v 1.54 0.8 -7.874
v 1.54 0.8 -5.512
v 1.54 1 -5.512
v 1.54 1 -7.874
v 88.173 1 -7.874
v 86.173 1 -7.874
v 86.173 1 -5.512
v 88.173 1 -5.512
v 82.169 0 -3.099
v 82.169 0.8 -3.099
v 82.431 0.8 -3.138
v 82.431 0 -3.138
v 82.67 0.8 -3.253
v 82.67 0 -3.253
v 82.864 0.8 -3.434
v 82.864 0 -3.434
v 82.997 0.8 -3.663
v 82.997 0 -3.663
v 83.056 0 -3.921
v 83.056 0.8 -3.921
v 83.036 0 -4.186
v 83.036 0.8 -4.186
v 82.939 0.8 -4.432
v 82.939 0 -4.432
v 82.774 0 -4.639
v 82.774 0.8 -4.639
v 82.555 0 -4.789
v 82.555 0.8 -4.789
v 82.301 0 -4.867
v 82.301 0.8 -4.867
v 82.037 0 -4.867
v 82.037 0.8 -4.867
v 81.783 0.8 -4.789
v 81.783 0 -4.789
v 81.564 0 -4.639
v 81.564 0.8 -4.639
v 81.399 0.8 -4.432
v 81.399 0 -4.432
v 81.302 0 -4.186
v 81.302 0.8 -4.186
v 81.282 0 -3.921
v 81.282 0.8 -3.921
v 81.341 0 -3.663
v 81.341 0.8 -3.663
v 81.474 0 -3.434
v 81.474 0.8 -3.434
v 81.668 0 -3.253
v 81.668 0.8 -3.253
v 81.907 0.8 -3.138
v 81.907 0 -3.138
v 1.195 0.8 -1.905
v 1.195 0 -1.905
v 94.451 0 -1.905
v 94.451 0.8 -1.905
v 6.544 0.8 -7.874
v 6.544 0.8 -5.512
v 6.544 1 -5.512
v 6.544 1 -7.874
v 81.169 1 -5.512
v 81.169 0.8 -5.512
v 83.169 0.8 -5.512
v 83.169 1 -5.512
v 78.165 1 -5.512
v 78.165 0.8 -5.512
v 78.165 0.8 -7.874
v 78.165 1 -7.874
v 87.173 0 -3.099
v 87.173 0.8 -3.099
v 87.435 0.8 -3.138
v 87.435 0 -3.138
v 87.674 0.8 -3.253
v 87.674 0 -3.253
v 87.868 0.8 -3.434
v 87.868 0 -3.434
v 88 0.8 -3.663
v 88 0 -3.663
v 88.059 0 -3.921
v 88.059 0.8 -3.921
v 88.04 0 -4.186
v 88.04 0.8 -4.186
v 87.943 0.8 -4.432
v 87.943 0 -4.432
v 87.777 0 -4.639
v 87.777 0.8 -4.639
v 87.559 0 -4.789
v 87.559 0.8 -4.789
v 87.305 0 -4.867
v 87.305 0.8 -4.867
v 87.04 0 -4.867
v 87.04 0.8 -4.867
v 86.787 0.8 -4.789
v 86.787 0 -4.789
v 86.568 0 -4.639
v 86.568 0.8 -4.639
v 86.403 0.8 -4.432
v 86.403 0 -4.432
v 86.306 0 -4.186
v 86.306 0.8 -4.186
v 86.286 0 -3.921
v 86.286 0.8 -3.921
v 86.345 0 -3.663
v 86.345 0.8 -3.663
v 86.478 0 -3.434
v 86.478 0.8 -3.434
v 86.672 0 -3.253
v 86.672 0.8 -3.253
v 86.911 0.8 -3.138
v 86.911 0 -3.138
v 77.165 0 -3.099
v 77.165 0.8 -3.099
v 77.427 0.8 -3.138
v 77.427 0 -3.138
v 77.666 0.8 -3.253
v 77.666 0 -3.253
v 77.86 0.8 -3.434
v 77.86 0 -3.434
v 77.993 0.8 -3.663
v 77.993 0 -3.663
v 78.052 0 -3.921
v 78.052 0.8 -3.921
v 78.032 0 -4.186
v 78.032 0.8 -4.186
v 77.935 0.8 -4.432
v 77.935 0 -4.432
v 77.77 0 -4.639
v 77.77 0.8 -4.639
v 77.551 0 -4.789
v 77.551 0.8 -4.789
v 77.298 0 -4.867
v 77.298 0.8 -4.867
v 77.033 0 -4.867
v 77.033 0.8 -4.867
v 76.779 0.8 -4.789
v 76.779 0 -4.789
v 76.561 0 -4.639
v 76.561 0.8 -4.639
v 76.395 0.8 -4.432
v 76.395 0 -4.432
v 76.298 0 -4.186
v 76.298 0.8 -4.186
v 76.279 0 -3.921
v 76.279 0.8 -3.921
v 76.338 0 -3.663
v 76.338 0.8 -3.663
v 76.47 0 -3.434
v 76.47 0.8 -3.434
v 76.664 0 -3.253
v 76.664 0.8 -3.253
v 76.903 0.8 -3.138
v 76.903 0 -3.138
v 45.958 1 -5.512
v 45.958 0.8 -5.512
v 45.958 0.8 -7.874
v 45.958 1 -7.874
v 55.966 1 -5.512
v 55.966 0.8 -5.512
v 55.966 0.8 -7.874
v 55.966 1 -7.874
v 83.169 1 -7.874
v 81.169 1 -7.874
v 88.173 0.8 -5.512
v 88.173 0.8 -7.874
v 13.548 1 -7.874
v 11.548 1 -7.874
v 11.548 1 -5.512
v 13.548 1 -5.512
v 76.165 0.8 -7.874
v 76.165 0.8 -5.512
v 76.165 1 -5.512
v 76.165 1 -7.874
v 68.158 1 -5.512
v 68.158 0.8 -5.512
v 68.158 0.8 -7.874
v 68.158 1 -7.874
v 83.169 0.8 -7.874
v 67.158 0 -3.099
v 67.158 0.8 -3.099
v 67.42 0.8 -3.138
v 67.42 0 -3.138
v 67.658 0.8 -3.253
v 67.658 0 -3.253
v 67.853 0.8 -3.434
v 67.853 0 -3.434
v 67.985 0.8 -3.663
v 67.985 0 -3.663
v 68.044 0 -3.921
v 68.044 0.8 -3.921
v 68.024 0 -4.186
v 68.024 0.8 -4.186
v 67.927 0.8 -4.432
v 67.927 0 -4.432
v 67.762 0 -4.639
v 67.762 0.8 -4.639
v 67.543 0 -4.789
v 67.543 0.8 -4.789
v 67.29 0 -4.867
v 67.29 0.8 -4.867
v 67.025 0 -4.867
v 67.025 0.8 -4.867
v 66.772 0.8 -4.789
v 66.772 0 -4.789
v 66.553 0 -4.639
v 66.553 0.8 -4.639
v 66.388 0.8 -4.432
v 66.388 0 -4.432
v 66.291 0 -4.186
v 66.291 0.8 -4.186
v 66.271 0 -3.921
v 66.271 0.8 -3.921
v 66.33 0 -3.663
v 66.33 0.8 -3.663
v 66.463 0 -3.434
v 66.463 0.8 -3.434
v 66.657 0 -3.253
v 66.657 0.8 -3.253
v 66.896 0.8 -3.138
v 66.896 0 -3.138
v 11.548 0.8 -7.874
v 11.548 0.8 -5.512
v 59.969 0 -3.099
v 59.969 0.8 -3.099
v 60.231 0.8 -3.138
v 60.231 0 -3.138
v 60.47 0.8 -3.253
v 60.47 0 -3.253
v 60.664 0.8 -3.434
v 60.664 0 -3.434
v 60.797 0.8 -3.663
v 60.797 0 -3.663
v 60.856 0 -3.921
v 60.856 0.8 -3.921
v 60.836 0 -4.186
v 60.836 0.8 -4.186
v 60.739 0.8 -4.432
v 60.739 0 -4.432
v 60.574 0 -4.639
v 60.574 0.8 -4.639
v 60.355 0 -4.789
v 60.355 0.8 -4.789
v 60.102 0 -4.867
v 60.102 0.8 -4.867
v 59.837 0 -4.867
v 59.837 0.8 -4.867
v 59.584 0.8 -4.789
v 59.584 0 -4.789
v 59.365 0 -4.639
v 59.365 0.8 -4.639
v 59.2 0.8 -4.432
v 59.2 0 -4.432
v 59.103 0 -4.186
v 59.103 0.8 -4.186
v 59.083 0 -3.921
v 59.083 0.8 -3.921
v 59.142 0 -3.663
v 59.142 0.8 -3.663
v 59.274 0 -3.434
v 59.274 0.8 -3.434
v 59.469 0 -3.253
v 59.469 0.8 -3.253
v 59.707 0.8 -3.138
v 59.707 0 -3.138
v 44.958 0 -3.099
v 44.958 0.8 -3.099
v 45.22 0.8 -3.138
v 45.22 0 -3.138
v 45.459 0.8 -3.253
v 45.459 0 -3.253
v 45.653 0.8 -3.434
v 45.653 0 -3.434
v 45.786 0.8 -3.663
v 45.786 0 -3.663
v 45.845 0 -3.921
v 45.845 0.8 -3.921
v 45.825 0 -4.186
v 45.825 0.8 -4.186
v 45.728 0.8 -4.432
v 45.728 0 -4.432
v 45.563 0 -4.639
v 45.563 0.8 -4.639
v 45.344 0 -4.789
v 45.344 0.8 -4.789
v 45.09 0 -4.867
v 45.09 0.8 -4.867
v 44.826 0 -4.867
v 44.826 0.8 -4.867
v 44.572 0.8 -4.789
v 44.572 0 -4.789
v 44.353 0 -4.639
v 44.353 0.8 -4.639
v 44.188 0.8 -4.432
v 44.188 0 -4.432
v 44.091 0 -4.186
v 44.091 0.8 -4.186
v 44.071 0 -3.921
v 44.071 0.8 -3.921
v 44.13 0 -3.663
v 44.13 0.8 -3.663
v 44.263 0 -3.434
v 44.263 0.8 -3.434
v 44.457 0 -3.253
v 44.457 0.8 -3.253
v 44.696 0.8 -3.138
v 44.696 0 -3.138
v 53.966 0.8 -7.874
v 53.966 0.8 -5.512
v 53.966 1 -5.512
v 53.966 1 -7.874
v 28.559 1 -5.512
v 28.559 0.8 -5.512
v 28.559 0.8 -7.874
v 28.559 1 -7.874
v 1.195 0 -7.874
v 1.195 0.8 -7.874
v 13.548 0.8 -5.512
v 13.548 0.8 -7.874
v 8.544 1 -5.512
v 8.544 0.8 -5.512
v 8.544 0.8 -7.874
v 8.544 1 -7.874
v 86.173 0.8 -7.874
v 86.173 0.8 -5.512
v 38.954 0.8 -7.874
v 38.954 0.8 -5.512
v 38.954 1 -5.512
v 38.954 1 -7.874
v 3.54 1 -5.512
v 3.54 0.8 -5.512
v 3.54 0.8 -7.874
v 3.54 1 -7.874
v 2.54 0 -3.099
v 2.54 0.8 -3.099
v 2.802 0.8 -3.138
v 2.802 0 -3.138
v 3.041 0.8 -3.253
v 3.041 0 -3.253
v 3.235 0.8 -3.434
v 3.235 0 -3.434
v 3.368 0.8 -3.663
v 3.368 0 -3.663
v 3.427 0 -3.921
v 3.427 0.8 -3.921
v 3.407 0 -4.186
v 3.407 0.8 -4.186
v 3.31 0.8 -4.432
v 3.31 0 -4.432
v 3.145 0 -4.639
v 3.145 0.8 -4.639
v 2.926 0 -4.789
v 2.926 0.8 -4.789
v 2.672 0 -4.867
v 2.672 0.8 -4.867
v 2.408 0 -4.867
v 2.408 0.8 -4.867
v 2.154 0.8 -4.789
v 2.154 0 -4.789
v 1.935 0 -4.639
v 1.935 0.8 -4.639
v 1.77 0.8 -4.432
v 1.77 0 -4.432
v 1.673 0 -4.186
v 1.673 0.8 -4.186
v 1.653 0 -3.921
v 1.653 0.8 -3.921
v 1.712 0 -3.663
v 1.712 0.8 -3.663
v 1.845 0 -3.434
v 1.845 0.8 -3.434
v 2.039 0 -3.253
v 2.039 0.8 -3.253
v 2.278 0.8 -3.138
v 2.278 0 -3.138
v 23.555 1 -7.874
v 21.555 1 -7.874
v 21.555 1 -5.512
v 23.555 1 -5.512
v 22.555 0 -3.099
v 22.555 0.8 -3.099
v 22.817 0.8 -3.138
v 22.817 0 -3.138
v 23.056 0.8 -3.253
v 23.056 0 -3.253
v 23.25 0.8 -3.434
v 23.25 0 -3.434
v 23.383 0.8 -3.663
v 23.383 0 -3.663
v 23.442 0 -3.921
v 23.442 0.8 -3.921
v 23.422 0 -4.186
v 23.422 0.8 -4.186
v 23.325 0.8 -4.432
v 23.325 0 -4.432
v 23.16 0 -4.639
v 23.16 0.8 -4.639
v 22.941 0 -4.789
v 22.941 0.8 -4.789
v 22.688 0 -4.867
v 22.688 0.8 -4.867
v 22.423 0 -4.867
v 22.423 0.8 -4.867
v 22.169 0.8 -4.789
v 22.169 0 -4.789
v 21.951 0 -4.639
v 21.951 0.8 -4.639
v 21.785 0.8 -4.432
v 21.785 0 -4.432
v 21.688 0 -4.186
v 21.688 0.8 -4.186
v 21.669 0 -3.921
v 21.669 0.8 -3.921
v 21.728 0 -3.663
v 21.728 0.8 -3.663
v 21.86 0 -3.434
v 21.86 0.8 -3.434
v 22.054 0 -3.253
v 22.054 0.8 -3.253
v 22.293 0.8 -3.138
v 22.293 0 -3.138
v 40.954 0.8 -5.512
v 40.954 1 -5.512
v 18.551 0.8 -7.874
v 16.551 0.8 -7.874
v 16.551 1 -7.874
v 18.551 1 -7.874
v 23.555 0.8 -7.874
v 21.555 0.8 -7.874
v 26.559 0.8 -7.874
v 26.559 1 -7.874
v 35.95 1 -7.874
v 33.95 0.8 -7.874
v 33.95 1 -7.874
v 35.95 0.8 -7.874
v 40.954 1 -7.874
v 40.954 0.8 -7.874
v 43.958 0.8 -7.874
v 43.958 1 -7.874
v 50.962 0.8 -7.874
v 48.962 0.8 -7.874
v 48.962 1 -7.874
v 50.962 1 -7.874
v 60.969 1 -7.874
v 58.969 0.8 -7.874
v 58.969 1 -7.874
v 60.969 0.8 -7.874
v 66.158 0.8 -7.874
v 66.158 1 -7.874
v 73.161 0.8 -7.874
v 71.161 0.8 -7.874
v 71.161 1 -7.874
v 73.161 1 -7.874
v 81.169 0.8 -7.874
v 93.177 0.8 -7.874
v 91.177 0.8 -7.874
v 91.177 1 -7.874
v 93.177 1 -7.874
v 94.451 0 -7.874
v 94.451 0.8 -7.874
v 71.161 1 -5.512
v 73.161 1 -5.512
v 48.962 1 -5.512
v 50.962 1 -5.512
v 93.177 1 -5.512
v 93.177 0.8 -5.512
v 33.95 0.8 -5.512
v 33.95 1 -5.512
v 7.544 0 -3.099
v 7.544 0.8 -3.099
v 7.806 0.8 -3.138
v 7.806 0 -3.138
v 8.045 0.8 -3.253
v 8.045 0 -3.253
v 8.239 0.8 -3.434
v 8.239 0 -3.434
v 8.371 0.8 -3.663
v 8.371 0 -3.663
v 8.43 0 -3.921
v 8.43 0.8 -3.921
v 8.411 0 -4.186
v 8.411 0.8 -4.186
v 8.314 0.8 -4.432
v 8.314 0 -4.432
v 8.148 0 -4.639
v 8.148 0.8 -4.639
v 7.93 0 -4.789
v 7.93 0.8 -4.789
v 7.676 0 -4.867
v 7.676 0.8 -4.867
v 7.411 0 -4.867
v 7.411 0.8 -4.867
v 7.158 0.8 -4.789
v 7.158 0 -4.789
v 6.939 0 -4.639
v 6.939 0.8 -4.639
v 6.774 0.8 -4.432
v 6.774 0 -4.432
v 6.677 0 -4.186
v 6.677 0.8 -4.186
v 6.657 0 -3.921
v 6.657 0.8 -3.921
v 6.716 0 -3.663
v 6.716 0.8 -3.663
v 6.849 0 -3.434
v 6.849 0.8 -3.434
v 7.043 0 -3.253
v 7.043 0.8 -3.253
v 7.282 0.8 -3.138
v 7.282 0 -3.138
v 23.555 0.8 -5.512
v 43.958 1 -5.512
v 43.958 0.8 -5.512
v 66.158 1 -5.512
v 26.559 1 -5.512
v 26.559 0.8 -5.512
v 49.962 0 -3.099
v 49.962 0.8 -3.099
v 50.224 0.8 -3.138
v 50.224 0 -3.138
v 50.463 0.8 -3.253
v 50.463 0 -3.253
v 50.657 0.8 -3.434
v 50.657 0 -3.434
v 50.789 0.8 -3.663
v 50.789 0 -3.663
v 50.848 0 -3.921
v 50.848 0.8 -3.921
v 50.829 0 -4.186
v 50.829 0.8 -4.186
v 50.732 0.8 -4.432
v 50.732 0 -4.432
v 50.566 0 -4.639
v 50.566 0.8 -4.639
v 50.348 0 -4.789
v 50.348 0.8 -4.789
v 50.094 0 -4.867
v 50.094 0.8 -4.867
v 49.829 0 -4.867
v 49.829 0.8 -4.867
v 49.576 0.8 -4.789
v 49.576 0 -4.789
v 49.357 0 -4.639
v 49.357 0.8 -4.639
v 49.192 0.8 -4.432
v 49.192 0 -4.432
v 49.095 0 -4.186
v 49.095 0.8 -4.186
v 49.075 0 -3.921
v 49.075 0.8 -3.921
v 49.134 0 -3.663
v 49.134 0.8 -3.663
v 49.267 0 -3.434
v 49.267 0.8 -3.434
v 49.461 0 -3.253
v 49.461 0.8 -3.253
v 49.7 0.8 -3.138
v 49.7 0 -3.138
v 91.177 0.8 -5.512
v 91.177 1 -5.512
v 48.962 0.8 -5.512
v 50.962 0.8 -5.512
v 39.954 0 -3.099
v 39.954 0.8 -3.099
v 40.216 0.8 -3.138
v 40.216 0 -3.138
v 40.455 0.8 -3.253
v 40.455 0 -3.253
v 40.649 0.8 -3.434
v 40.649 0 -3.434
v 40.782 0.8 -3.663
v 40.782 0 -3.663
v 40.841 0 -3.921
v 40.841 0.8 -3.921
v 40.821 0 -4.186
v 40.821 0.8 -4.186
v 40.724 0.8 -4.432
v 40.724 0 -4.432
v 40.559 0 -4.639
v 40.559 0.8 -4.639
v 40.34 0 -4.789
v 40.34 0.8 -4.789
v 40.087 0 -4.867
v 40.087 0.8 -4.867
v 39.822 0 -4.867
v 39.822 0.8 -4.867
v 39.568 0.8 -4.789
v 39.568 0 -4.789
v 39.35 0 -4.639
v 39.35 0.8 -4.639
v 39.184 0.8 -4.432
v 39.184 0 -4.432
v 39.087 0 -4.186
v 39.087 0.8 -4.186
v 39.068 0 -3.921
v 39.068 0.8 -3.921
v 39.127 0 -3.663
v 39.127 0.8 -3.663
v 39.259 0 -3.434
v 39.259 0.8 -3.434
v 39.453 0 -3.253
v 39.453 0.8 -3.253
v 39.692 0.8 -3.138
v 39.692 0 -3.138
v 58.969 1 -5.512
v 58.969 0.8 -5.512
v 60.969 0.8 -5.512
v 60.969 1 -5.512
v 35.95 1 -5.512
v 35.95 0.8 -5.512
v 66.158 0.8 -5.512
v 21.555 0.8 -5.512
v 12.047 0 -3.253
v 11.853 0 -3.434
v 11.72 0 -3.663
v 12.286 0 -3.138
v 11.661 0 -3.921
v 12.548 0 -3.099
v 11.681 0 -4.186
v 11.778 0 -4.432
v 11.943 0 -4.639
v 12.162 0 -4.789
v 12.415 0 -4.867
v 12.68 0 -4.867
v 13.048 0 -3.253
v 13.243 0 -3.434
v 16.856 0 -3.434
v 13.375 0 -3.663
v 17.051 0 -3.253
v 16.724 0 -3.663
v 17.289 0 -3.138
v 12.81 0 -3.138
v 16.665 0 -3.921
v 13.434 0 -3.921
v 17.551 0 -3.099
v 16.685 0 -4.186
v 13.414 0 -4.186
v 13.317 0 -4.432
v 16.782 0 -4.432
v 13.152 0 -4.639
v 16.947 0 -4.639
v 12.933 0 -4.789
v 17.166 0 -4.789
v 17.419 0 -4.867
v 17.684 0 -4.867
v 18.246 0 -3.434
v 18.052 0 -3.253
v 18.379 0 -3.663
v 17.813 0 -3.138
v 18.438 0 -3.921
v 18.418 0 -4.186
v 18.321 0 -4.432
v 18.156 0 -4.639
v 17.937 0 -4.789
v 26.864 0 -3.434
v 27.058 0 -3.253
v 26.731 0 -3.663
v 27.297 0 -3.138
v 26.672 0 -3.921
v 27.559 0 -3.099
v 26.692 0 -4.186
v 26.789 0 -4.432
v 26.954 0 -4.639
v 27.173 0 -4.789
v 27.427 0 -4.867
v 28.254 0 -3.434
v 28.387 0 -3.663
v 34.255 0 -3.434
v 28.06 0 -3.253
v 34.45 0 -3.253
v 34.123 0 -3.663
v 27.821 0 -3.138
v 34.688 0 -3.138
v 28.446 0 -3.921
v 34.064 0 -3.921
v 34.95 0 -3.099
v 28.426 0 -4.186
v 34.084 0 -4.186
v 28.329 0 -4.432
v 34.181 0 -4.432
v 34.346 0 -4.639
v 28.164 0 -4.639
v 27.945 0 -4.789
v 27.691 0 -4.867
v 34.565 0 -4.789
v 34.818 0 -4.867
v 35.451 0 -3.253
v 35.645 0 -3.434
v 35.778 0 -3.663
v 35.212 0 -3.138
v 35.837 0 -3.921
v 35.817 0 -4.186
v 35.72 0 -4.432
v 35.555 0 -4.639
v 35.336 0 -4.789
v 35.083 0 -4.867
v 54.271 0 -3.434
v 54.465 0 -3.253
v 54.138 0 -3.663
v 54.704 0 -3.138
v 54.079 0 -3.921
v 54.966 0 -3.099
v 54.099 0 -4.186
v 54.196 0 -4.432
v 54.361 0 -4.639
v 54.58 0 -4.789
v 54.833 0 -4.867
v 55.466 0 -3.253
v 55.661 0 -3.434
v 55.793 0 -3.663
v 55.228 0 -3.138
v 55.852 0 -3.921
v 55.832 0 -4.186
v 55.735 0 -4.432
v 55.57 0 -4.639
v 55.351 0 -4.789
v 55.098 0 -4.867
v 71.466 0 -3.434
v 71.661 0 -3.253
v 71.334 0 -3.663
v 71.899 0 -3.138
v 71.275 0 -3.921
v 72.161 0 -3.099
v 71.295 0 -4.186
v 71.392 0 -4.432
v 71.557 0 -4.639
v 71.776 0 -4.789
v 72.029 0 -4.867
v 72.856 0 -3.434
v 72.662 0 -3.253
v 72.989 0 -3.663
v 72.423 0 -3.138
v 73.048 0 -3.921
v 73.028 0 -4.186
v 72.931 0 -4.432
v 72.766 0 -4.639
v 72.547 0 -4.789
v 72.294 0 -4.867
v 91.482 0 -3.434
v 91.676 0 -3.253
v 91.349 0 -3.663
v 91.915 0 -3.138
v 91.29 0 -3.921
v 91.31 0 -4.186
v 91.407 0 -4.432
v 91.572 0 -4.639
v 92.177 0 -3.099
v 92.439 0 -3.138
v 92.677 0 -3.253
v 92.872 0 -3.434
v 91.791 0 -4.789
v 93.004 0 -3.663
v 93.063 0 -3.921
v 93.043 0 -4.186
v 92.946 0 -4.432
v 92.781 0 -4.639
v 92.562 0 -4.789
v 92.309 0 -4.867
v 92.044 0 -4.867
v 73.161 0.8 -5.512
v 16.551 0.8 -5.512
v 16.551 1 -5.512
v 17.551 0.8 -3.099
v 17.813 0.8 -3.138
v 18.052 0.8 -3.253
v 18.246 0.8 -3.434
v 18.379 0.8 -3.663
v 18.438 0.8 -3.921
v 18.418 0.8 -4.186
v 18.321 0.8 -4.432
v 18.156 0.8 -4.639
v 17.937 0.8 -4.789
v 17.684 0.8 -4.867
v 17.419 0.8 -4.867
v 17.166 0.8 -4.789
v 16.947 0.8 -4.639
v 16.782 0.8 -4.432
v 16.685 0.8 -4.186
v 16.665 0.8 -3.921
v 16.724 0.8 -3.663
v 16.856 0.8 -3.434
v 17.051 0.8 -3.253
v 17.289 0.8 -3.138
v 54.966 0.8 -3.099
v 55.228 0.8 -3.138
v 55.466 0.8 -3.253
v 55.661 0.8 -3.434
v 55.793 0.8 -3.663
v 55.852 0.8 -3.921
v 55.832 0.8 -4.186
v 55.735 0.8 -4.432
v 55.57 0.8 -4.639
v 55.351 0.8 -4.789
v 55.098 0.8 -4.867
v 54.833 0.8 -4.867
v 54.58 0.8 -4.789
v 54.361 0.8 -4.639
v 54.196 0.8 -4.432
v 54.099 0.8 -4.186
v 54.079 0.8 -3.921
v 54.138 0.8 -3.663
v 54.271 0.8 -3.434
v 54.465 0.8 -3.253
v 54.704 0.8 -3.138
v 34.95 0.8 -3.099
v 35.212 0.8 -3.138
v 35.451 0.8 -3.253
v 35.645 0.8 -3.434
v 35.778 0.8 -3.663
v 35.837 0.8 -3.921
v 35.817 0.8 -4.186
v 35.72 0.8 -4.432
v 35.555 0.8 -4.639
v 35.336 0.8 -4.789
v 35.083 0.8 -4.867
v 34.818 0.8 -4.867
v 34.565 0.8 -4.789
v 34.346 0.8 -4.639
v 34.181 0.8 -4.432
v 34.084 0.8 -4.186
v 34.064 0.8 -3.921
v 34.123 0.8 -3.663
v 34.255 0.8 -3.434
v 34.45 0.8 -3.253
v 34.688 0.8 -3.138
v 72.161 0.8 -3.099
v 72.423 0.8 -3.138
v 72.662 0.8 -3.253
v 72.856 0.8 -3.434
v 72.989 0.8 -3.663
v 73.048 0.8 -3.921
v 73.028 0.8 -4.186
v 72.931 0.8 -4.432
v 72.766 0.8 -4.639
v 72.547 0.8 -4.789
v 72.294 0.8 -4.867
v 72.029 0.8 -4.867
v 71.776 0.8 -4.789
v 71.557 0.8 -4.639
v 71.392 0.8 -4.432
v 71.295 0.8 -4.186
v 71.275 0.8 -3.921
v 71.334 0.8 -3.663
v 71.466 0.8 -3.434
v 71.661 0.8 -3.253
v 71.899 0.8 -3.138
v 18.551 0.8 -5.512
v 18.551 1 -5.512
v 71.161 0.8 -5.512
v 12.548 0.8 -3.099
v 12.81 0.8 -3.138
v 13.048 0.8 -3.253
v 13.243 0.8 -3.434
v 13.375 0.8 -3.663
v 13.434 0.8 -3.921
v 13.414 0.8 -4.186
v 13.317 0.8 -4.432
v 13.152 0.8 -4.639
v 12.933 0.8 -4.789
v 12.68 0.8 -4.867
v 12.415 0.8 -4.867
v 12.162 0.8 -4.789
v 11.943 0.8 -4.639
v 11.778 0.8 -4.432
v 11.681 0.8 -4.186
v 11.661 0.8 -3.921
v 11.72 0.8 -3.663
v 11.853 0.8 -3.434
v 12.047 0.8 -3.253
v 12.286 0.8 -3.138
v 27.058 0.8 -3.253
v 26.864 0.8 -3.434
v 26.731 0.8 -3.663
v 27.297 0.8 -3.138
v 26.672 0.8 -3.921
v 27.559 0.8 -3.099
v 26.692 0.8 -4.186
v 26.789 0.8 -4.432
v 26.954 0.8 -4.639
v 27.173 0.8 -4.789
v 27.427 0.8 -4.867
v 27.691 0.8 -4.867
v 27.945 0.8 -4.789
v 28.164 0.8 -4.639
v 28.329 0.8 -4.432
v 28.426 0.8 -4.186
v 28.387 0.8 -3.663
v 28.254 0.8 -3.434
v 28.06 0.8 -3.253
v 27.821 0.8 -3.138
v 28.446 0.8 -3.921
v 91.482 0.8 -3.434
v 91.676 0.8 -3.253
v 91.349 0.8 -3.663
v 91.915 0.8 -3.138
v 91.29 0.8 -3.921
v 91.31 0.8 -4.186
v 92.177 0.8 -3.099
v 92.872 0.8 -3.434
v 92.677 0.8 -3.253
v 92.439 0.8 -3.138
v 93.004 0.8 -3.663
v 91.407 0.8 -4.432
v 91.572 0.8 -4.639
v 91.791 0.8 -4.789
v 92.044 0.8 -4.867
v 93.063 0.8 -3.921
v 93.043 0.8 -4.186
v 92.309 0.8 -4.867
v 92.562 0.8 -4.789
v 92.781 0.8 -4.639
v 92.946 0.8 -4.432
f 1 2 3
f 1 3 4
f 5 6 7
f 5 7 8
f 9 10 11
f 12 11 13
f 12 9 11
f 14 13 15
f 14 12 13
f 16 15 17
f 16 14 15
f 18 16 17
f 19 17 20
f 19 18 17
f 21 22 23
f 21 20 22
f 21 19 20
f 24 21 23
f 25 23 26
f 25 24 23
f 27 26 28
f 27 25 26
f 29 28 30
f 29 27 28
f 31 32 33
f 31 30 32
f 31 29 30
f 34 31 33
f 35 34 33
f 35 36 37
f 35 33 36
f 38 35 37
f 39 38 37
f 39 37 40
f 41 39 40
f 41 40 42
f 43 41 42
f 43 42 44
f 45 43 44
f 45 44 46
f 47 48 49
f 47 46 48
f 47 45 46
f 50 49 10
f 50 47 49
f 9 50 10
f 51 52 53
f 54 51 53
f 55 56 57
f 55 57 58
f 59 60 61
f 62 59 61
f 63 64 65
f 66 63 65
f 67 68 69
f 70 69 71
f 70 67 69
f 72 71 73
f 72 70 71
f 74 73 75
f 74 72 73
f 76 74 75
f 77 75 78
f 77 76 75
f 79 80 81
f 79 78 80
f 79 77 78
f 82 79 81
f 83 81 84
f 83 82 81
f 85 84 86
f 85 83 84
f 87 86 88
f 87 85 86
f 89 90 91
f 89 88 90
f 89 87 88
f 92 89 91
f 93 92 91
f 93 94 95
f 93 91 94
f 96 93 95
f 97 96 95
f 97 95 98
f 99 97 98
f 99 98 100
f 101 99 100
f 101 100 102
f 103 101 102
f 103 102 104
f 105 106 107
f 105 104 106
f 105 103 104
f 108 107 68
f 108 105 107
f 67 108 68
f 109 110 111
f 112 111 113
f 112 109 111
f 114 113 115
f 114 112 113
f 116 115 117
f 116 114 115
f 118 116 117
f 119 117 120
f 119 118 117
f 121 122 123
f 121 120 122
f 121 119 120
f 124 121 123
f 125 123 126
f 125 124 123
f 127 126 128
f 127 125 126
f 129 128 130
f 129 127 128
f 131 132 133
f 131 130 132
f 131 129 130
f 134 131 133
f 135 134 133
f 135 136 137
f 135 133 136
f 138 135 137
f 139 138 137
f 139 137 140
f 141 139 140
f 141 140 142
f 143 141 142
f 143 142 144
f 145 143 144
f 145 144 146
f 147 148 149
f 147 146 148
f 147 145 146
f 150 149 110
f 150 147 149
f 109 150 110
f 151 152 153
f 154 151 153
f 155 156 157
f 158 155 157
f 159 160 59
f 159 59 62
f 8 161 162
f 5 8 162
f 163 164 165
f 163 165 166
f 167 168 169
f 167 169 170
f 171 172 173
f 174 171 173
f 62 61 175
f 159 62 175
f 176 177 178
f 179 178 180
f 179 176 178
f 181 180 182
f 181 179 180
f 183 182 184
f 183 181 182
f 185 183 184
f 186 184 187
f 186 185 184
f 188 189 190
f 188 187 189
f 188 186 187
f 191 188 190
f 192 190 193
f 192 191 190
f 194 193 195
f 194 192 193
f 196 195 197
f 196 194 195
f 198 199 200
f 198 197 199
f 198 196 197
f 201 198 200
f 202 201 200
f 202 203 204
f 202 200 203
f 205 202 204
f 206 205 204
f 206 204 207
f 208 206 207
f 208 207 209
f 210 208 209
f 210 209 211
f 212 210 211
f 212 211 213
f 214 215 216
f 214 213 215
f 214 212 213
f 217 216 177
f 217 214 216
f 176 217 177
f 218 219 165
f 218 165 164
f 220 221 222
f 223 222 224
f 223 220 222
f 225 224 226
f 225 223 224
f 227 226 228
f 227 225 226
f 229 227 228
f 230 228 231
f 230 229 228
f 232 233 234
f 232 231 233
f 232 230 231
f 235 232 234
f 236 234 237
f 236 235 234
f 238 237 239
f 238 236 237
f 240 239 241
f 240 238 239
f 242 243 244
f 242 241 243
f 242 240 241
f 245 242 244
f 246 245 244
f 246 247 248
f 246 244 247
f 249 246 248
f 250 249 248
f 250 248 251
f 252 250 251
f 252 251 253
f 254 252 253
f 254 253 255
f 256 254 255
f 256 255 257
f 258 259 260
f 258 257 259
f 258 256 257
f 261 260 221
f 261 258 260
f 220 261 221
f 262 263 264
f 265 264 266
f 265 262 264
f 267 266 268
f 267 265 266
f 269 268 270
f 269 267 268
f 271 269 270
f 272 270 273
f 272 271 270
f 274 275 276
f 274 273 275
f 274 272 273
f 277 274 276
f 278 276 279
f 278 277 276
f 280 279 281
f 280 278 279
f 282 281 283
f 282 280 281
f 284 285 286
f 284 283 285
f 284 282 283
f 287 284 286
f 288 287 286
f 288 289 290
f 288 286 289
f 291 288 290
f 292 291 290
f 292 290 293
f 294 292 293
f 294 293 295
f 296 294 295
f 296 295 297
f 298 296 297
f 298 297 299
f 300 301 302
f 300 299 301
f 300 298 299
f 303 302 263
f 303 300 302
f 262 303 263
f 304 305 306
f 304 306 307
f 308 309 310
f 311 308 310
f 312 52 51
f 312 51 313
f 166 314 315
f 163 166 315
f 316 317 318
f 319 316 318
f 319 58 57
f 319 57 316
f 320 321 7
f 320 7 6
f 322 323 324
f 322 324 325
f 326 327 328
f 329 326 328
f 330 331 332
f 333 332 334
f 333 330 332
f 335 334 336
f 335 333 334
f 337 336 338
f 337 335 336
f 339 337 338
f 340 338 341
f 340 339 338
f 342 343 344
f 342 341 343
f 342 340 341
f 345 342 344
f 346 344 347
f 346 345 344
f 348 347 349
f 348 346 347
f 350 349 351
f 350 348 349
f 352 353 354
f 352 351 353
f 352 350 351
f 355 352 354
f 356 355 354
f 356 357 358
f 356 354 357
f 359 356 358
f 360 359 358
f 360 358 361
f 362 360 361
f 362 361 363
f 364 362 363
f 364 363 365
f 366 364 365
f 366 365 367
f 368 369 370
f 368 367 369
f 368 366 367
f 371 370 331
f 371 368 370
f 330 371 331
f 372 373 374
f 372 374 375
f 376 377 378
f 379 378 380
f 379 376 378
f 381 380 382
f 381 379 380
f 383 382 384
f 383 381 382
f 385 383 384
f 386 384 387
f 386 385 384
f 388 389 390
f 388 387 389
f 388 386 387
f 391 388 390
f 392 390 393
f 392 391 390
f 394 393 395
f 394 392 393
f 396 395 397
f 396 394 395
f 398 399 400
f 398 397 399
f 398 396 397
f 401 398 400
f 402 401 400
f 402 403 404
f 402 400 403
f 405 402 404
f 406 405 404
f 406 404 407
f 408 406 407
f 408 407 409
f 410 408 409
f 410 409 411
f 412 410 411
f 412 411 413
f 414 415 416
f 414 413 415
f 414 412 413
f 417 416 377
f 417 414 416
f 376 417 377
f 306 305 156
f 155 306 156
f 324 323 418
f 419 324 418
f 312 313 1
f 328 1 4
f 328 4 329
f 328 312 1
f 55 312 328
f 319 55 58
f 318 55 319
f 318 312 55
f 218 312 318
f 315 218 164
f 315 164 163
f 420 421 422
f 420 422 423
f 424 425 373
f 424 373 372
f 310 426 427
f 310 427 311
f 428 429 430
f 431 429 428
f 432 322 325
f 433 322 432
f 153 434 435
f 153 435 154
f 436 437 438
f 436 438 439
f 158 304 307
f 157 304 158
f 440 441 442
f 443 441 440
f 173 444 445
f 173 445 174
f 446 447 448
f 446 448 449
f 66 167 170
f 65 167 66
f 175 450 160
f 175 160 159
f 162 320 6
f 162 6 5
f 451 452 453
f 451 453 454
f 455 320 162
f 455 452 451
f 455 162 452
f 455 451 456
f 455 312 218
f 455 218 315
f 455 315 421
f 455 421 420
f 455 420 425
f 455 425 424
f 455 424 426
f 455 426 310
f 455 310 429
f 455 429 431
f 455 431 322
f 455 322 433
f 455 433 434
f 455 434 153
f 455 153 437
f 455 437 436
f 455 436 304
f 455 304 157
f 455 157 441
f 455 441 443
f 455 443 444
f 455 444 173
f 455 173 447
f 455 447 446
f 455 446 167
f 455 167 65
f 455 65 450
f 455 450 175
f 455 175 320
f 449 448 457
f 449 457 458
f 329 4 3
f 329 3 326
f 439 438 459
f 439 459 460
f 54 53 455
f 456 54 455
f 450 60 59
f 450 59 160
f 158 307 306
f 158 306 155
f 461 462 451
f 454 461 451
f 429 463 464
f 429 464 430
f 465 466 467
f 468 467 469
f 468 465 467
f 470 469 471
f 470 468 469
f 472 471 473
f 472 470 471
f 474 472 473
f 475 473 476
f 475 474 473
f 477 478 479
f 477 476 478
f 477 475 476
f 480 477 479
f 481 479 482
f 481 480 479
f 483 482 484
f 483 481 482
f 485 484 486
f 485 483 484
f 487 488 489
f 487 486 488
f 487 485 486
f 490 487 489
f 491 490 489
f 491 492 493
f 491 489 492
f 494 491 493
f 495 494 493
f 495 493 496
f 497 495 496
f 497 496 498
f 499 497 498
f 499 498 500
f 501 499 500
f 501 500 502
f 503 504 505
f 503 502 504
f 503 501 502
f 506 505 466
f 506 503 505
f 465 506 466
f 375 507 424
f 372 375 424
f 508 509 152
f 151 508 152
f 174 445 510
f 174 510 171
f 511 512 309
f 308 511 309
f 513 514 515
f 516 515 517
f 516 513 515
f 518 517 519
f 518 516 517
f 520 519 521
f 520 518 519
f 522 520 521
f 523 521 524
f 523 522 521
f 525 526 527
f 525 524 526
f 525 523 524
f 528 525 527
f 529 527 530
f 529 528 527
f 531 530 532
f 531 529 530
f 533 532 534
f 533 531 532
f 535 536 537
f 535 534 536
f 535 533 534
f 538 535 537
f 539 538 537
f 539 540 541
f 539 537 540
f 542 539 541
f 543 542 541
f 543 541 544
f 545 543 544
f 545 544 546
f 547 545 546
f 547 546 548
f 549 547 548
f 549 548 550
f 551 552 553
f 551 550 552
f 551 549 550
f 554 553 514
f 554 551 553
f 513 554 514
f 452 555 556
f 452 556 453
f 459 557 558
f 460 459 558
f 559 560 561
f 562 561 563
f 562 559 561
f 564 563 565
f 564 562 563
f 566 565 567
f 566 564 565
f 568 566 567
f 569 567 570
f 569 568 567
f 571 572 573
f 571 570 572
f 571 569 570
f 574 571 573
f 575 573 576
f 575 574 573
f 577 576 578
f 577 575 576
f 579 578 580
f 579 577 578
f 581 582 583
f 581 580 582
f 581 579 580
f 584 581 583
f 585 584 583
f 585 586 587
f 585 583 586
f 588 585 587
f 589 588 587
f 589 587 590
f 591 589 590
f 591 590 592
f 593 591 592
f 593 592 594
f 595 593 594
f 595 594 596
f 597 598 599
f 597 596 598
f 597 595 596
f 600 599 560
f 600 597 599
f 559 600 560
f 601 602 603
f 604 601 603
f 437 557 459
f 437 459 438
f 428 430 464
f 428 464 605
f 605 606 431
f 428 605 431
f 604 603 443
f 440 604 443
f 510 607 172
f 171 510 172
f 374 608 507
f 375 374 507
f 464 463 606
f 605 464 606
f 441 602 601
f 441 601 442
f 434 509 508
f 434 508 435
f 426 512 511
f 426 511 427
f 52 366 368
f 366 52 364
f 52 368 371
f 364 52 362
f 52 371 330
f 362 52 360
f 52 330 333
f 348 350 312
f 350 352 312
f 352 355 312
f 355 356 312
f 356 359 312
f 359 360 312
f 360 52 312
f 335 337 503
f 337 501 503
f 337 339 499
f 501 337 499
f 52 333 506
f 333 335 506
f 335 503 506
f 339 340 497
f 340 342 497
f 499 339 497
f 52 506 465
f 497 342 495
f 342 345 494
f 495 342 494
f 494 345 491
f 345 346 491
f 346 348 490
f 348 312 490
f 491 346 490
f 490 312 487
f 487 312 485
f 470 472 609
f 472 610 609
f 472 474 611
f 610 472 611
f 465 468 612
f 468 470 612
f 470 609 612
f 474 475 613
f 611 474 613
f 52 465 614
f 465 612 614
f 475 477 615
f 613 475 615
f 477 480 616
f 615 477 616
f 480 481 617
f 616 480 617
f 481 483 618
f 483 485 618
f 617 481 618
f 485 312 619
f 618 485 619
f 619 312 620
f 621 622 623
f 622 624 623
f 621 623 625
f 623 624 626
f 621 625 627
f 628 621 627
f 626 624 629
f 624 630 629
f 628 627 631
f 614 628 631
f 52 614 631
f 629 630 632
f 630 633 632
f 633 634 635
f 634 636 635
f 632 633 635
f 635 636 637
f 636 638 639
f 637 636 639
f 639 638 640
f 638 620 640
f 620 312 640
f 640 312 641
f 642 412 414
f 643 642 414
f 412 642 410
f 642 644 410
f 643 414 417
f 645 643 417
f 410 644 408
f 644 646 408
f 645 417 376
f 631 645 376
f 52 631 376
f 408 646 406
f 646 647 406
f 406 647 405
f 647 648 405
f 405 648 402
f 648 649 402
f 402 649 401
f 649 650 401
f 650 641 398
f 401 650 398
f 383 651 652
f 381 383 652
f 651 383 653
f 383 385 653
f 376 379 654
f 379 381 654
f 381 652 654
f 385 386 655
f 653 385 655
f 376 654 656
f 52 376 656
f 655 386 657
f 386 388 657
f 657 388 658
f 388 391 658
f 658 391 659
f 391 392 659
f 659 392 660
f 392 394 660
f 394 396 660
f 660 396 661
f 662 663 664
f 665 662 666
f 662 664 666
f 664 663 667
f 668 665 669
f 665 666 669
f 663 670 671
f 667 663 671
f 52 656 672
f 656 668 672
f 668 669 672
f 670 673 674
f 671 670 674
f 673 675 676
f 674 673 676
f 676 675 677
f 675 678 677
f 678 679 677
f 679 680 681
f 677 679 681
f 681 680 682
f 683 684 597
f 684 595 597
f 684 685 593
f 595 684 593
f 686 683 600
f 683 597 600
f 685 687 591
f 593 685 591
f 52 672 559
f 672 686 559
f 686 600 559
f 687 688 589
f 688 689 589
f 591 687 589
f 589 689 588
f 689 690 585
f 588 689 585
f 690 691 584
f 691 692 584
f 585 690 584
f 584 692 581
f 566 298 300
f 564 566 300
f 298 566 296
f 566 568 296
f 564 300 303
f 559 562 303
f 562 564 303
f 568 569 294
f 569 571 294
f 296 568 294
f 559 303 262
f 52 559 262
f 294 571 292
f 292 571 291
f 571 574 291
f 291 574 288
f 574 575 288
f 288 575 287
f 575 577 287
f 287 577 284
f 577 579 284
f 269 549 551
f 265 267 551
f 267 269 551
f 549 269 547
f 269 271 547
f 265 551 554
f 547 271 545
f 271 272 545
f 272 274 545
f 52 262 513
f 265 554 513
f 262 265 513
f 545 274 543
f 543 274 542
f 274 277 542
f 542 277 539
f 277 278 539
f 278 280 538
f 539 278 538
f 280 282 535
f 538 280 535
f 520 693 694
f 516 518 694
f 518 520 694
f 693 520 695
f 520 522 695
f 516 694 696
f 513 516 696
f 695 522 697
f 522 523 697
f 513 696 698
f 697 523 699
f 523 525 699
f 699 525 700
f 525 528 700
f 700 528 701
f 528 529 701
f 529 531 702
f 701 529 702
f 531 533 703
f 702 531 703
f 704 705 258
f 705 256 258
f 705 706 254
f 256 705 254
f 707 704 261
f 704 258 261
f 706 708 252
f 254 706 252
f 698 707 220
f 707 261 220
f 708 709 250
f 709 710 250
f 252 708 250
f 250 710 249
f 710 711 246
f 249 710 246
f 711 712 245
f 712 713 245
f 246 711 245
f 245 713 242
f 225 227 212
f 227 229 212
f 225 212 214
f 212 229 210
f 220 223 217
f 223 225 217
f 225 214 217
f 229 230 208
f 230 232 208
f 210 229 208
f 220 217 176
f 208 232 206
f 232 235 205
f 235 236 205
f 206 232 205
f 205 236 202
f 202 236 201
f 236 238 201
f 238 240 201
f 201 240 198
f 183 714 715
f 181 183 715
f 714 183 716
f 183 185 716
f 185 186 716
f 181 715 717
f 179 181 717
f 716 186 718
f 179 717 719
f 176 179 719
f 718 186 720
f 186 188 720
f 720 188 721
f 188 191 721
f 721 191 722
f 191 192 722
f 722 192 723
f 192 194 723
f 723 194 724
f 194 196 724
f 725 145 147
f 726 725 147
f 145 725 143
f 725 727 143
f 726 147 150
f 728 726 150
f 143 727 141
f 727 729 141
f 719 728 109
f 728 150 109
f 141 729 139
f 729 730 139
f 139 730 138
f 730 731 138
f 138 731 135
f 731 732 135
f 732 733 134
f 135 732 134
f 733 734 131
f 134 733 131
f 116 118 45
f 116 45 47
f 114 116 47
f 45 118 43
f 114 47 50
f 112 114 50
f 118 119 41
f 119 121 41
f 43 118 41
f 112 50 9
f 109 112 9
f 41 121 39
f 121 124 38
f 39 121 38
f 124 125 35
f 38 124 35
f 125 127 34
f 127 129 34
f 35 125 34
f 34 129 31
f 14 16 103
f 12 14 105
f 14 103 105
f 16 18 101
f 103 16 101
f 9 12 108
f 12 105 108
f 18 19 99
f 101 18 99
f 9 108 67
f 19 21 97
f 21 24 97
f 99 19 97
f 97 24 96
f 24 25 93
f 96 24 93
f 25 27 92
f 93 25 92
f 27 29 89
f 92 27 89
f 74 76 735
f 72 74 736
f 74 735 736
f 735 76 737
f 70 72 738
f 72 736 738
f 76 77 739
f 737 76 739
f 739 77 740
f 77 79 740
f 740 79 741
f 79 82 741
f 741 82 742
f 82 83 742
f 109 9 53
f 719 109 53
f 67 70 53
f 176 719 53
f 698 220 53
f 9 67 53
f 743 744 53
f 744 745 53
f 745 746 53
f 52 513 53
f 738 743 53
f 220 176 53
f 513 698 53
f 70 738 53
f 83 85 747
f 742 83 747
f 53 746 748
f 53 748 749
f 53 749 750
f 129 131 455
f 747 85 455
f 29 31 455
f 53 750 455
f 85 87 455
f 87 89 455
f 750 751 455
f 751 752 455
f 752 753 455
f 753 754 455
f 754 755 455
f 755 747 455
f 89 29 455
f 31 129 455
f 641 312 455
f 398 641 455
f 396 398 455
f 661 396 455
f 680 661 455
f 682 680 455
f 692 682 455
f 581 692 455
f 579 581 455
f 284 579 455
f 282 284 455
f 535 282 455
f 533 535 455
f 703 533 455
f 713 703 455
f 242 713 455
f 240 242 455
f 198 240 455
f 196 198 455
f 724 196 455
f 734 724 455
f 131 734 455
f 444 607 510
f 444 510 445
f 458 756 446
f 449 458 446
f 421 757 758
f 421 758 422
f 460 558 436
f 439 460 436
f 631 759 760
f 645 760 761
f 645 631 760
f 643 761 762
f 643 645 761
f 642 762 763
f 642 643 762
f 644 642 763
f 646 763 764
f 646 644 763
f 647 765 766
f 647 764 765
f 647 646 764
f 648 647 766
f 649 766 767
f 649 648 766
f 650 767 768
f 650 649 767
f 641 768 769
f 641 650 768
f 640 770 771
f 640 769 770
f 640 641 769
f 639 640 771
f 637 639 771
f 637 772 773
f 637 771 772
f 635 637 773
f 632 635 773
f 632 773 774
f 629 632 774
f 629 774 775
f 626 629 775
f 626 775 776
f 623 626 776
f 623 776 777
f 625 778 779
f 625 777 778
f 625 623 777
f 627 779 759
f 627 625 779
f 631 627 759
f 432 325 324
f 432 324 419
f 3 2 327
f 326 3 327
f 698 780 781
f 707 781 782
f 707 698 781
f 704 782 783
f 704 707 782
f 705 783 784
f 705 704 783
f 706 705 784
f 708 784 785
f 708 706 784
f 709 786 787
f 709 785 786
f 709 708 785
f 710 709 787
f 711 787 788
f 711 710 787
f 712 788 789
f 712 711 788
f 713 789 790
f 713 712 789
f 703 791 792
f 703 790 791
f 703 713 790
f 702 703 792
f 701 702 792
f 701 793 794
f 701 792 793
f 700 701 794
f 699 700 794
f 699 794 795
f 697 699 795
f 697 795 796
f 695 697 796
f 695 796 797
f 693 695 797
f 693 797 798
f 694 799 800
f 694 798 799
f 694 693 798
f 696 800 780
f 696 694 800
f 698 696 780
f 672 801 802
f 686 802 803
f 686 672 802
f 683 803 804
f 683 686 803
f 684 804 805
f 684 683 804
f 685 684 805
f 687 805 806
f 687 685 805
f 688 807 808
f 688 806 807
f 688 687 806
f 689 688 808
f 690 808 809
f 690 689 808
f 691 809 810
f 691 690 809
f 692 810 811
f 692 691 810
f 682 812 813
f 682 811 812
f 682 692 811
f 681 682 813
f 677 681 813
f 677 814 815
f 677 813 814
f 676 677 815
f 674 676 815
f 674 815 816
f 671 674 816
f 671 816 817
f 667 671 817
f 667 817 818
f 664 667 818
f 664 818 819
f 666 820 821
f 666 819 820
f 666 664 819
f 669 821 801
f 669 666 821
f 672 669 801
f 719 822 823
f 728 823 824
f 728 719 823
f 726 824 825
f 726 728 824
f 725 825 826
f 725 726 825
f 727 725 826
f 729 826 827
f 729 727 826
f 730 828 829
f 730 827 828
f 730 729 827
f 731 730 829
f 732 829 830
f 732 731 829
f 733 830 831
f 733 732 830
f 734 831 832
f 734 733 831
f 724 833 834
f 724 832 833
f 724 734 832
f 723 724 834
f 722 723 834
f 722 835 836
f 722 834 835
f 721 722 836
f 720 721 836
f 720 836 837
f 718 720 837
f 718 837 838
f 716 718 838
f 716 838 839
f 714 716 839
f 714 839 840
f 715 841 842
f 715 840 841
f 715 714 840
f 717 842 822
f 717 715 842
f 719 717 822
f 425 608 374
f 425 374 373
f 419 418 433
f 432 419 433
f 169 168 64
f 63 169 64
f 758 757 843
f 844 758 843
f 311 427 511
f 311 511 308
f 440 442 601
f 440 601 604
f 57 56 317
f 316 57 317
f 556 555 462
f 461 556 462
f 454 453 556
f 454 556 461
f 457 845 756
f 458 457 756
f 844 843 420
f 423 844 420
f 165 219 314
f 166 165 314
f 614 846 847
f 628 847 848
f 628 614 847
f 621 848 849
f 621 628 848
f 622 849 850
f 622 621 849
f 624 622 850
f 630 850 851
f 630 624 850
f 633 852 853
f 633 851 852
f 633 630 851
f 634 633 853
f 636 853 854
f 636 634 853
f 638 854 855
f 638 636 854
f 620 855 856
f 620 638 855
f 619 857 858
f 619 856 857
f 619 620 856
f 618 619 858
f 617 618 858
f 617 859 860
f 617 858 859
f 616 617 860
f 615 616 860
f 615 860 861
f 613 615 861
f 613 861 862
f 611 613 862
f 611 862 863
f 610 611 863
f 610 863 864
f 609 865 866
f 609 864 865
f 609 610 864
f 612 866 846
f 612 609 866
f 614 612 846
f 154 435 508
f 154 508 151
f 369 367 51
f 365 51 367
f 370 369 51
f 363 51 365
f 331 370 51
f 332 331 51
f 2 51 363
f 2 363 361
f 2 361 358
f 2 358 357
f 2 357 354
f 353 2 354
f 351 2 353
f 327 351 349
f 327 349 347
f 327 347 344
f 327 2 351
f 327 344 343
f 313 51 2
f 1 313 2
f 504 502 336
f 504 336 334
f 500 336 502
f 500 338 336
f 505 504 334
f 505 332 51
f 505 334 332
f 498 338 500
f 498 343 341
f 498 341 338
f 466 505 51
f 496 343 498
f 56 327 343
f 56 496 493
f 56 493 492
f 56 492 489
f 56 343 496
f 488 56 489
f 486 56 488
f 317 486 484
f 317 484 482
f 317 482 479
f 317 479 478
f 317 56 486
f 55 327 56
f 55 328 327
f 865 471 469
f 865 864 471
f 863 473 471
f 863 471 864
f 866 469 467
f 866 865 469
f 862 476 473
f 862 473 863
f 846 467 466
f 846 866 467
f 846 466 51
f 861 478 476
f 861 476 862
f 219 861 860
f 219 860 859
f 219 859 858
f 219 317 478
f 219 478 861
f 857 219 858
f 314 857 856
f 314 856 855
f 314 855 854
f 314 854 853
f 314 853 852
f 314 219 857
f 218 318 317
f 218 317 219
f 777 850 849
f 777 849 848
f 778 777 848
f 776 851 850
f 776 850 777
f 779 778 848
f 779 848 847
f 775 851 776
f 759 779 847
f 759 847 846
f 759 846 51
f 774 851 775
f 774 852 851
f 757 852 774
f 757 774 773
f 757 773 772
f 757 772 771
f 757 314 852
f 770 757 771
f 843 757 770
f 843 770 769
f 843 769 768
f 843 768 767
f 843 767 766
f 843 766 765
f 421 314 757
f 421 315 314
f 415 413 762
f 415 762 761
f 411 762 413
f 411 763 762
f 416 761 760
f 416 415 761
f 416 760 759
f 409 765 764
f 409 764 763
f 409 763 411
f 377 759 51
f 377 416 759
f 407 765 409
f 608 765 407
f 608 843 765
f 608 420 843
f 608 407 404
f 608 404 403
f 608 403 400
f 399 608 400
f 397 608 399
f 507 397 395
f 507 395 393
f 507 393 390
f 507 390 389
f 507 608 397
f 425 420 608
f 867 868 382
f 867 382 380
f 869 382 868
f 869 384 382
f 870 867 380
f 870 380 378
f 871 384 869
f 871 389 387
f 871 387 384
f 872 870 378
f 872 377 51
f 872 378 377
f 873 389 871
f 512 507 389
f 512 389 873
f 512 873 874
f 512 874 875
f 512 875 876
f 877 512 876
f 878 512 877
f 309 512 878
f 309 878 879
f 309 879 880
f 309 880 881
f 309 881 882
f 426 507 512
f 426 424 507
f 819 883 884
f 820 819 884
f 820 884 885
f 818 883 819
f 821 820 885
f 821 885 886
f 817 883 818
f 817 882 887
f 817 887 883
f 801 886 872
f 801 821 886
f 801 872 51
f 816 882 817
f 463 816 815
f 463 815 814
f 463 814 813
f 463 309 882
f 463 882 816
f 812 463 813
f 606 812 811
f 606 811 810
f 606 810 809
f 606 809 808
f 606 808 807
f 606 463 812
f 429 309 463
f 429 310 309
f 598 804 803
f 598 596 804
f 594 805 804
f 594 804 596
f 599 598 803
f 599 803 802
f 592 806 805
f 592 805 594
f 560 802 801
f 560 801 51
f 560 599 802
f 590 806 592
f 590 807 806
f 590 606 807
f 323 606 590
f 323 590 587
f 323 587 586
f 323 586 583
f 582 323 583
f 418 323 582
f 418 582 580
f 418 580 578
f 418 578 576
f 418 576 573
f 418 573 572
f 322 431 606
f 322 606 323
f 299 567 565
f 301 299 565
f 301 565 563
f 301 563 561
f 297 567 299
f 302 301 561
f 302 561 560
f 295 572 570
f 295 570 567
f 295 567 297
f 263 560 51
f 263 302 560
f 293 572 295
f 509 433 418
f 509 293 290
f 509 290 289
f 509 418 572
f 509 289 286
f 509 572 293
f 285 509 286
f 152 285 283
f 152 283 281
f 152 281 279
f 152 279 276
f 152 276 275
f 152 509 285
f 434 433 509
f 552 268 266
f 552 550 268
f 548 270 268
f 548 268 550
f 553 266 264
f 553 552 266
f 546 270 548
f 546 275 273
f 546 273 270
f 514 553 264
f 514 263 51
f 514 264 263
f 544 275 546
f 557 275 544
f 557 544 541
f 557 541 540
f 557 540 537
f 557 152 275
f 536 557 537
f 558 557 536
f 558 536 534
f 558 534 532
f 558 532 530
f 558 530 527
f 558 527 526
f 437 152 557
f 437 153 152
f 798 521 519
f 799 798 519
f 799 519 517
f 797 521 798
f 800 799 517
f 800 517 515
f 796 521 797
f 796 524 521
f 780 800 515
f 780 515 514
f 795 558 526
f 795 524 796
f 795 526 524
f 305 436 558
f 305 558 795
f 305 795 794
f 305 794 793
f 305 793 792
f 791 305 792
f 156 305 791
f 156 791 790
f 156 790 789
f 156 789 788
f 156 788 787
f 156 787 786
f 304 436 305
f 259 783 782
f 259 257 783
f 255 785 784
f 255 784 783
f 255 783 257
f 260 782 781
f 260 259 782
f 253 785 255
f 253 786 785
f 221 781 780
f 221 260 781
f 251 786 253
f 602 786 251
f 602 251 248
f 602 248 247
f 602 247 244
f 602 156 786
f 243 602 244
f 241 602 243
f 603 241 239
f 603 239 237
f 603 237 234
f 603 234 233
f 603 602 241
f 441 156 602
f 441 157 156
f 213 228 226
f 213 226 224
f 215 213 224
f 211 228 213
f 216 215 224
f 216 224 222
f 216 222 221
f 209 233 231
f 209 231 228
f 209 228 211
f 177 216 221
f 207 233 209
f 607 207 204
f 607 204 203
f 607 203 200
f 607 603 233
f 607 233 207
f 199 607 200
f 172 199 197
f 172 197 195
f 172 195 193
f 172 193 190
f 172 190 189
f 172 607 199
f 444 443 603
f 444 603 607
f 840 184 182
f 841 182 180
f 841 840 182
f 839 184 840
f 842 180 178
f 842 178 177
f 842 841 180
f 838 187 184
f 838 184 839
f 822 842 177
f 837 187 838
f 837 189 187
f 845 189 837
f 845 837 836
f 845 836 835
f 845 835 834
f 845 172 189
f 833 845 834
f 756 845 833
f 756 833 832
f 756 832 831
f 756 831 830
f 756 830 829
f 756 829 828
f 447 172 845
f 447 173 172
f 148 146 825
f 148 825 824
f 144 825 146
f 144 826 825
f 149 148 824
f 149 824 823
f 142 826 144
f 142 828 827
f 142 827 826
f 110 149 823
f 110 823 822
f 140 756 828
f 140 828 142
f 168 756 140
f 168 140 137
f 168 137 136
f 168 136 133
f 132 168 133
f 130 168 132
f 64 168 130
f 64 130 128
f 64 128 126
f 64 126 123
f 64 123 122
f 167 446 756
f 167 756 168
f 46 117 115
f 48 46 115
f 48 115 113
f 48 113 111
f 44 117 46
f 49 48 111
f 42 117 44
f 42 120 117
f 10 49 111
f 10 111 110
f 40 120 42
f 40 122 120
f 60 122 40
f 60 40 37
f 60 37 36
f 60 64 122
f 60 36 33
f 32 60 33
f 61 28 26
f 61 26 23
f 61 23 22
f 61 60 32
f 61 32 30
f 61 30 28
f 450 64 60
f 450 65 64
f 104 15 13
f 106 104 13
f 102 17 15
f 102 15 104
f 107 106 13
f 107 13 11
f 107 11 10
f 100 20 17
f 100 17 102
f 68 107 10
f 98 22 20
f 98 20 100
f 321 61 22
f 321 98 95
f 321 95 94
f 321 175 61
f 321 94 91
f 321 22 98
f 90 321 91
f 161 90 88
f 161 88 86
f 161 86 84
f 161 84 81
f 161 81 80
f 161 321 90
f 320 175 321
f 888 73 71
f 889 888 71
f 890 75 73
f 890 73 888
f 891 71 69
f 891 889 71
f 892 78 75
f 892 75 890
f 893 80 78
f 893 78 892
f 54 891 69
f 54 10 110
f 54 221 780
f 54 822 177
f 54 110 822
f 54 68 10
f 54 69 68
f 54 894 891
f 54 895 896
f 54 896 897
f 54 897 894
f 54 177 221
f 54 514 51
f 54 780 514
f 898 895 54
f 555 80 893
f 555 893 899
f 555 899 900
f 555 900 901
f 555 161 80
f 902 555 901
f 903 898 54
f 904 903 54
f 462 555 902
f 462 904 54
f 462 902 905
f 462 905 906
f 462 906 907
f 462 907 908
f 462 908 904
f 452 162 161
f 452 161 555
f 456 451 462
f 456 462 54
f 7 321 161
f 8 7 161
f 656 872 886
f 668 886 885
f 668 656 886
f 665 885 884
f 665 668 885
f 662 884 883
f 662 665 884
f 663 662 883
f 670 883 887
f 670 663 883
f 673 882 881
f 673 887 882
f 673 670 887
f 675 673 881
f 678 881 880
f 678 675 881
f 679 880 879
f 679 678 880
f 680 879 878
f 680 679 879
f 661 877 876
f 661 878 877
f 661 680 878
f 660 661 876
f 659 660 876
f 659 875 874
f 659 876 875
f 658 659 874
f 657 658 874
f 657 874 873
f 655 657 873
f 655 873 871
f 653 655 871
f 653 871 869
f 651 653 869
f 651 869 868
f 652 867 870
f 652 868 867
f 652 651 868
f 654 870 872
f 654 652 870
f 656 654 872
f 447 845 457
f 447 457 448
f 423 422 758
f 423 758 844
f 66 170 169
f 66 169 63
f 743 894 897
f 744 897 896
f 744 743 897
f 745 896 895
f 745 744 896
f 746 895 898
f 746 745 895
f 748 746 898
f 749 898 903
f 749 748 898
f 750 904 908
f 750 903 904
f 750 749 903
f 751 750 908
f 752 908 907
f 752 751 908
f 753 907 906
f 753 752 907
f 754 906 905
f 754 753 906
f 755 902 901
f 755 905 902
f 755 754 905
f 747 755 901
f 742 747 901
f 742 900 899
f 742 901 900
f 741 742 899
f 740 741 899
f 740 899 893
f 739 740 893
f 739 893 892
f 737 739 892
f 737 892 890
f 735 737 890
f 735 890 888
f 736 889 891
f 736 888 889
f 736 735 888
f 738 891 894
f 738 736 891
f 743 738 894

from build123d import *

# Parameters (mm, degrees)
SKETCH1_W                = 96.52
SKETCH1_H                = 8.9916
MAIN_BOSS_DEPTH          = 0.8
SKETCH2_R                = 0.889
HOLES_FOR_PNP_PINS_DEPTH = 97.941215541
SKETCH3_W                = 2
SKETCH3_H                = 2.54
LOCATOR_TABS_DEPTH       = 0.2
SKETCH4_W                = 101.202450421
SKETCH4_H                = 13.068973156
SKETCH4_W_2              = 93.255989356
SKETCH4_H_2              = 5.969
CROP_DEPTH               = 97.943072319


with BuildPart() as part:
    # Sketch1 → main boss (new body)
    with BuildSketch(Plane(origin=(0, 0, 0), x_dir=(1, 0, 0), z_dir=(0, 1, 0))):
        with Locations((48.26, 4.4958)):
            Rectangle(SKETCH1_W, SKETCH1_H)
    extrude(amount=MAIN_BOSS_DEPTH)

    # Sketch2 → holes for PNP pins (cut, through all)
    with BuildSketch(Plane(origin=(0, 0, 0), x_dir=(1, 0, 0), z_dir=(0, 1, 0))):
        with Locations(Location((2.54, 3.9878, 0), (0, 0, 270))):
            Circle(SKETCH2_R)
        with Locations(Location((7.5438, 3.9878, 0), (0, 0, 270))):
            Circle(SKETCH2_R)
        with Locations(Location((12.5476, 3.9878, 0), (0, 0, 270))):
            Circle(SKETCH2_R)
        with Locations(Location((17.5514, 3.9878, 0), (0, 0, 270))):
            Circle(SKETCH2_R)
        with Locations(Location((22.5552, 3.9878, 0), (0, 0, 270))):
            Circle(SKETCH2_R)
        with Locations(Location((27.559, 3.9878, 0), (0, 0, 270))):
            Circle(SKETCH2_R)
        with Locations(Location((34.9504, 3.9878, 0), (0, 0, 270))):
            Circle(SKETCH2_R)
        with Locations(Location((39.9542, 3.9878, 0), (0, 0, 270))):
            Circle(SKETCH2_R)
        with Locations(Location((44.958, 3.9878, 0), (0, 0, 270))):
            Circle(SKETCH2_R)
        with Locations(Location((49.9618, 3.9878, 0), (0, 0, 270))):
            Circle(SKETCH2_R)
        with Locations(Location((54.9656, 3.9878, 0), (0, 0, 270))):
            Circle(SKETCH2_R)
        with Locations(Location((59.9694, 3.9878, 0), (0, 0, 270))):
            Circle(SKETCH2_R)
        with Locations(Location((67.1576, 3.9878, 0), (0, 0, 270))):
            Circle(SKETCH2_R)
        with Locations(Location((72.1614, 3.9878, 0), (0, 0, 270))):
            Circle(SKETCH2_R)
        with Locations(Location((77.1652, 3.9878, 0), (0, 0, 270))):
            Circle(SKETCH2_R)
        with Locations(Location((82.169, 3.9878, 0), (0, 0, 270))):
            Circle(SKETCH2_R)
        with Locations(Location((87.1728, 3.9878, 0), (0, 0, 270))):
            Circle(SKETCH2_R)
        with Locations(Location((92.1766, 3.9878, 0), (0, 0, 270))):
            Circle(SKETCH2_R)
    extrude(amount=HOLES_FOR_PNP_PINS_DEPTH, mode=Mode.SUBTRACT)

    # Sketch3 → locator tabs (add)
    with BuildSketch(Plane(origin=(0, 0.8, 0), x_dir=(1, 0, 0), z_dir=(0, 1, 0))):
        with Locations((7.5438, 6.7818)):
            Rectangle(SKETCH3_W, SKETCH3_H)
        with Locations((2.54, 6.7818)):
            Rectangle(SKETCH3_W, SKETCH3_H)
        with Locations((34.9504, 6.7818)):
            Rectangle(SKETCH3_W, SKETCH3_H)
        with Locations((67.1576, 6.7818)):
            Rectangle(SKETCH3_W, SKETCH3_H)
        with Locations((12.5476, 6.7818)):
            Rectangle(SKETCH3_W, SKETCH3_H)
        with Locations((17.5514, 6.7818)):
            Rectangle(SKETCH3_W, SKETCH3_H)
        with Locations((22.5552, 6.7818)):
            Rectangle(SKETCH3_W, SKETCH3_H)
        with Locations((27.559, 6.7818)):
            Rectangle(SKETCH3_W, SKETCH3_H)
        with Locations((39.9542, 6.7818)):
            Rectangle(SKETCH3_W, SKETCH3_H)
        with Locations((44.958, 6.7818)):
            Rectangle(SKETCH3_W, SKETCH3_H)
        with Locations((49.9618, 6.7818)):
            Rectangle(SKETCH3_W, SKETCH3_H)
        with Locations((54.9656, 6.7818)):
            Rectangle(SKETCH3_W, SKETCH3_H)
        with Locations((59.9694, 6.7818)):
            Rectangle(SKETCH3_W, SKETCH3_H)
        with Locations((72.1614, 6.7818)):
            Rectangle(SKETCH3_W, SKETCH3_H)
        with Locations((77.1652, 6.7818)):
            Rectangle(SKETCH3_W, SKETCH3_H)
        with Locations((82.169, 6.7818)):
            Rectangle(SKETCH3_W, SKETCH3_H)
        with Locations((87.1728, 6.7818)):
            Rectangle(SKETCH3_W, SKETCH3_H)
        with Locations((92.1766, 6.7818)):
            Rectangle(SKETCH3_W, SKETCH3_H)
    extrude(amount=LOCATOR_TABS_DEPTH)

    # Sketch4 → crop (cut, through all)
    with BuildSketch(Plane(origin=(0, 0, 0), x_dir=(1, 0, 0), z_dir=(0, 1, 0))):
        with Locations((47.986811927, 3.888963456)):
            Rectangle(SKETCH4_W, SKETCH4_H)
        with Locations((47.822628847, 4.8895)):
            Rectangle(SKETCH4_W_2, SKETCH4_H_2, mode=Mode.SUBTRACT)
    extrude(amount=CROP_DEPTH, mode=Mode.SUBTRACT)


solid = part.part
